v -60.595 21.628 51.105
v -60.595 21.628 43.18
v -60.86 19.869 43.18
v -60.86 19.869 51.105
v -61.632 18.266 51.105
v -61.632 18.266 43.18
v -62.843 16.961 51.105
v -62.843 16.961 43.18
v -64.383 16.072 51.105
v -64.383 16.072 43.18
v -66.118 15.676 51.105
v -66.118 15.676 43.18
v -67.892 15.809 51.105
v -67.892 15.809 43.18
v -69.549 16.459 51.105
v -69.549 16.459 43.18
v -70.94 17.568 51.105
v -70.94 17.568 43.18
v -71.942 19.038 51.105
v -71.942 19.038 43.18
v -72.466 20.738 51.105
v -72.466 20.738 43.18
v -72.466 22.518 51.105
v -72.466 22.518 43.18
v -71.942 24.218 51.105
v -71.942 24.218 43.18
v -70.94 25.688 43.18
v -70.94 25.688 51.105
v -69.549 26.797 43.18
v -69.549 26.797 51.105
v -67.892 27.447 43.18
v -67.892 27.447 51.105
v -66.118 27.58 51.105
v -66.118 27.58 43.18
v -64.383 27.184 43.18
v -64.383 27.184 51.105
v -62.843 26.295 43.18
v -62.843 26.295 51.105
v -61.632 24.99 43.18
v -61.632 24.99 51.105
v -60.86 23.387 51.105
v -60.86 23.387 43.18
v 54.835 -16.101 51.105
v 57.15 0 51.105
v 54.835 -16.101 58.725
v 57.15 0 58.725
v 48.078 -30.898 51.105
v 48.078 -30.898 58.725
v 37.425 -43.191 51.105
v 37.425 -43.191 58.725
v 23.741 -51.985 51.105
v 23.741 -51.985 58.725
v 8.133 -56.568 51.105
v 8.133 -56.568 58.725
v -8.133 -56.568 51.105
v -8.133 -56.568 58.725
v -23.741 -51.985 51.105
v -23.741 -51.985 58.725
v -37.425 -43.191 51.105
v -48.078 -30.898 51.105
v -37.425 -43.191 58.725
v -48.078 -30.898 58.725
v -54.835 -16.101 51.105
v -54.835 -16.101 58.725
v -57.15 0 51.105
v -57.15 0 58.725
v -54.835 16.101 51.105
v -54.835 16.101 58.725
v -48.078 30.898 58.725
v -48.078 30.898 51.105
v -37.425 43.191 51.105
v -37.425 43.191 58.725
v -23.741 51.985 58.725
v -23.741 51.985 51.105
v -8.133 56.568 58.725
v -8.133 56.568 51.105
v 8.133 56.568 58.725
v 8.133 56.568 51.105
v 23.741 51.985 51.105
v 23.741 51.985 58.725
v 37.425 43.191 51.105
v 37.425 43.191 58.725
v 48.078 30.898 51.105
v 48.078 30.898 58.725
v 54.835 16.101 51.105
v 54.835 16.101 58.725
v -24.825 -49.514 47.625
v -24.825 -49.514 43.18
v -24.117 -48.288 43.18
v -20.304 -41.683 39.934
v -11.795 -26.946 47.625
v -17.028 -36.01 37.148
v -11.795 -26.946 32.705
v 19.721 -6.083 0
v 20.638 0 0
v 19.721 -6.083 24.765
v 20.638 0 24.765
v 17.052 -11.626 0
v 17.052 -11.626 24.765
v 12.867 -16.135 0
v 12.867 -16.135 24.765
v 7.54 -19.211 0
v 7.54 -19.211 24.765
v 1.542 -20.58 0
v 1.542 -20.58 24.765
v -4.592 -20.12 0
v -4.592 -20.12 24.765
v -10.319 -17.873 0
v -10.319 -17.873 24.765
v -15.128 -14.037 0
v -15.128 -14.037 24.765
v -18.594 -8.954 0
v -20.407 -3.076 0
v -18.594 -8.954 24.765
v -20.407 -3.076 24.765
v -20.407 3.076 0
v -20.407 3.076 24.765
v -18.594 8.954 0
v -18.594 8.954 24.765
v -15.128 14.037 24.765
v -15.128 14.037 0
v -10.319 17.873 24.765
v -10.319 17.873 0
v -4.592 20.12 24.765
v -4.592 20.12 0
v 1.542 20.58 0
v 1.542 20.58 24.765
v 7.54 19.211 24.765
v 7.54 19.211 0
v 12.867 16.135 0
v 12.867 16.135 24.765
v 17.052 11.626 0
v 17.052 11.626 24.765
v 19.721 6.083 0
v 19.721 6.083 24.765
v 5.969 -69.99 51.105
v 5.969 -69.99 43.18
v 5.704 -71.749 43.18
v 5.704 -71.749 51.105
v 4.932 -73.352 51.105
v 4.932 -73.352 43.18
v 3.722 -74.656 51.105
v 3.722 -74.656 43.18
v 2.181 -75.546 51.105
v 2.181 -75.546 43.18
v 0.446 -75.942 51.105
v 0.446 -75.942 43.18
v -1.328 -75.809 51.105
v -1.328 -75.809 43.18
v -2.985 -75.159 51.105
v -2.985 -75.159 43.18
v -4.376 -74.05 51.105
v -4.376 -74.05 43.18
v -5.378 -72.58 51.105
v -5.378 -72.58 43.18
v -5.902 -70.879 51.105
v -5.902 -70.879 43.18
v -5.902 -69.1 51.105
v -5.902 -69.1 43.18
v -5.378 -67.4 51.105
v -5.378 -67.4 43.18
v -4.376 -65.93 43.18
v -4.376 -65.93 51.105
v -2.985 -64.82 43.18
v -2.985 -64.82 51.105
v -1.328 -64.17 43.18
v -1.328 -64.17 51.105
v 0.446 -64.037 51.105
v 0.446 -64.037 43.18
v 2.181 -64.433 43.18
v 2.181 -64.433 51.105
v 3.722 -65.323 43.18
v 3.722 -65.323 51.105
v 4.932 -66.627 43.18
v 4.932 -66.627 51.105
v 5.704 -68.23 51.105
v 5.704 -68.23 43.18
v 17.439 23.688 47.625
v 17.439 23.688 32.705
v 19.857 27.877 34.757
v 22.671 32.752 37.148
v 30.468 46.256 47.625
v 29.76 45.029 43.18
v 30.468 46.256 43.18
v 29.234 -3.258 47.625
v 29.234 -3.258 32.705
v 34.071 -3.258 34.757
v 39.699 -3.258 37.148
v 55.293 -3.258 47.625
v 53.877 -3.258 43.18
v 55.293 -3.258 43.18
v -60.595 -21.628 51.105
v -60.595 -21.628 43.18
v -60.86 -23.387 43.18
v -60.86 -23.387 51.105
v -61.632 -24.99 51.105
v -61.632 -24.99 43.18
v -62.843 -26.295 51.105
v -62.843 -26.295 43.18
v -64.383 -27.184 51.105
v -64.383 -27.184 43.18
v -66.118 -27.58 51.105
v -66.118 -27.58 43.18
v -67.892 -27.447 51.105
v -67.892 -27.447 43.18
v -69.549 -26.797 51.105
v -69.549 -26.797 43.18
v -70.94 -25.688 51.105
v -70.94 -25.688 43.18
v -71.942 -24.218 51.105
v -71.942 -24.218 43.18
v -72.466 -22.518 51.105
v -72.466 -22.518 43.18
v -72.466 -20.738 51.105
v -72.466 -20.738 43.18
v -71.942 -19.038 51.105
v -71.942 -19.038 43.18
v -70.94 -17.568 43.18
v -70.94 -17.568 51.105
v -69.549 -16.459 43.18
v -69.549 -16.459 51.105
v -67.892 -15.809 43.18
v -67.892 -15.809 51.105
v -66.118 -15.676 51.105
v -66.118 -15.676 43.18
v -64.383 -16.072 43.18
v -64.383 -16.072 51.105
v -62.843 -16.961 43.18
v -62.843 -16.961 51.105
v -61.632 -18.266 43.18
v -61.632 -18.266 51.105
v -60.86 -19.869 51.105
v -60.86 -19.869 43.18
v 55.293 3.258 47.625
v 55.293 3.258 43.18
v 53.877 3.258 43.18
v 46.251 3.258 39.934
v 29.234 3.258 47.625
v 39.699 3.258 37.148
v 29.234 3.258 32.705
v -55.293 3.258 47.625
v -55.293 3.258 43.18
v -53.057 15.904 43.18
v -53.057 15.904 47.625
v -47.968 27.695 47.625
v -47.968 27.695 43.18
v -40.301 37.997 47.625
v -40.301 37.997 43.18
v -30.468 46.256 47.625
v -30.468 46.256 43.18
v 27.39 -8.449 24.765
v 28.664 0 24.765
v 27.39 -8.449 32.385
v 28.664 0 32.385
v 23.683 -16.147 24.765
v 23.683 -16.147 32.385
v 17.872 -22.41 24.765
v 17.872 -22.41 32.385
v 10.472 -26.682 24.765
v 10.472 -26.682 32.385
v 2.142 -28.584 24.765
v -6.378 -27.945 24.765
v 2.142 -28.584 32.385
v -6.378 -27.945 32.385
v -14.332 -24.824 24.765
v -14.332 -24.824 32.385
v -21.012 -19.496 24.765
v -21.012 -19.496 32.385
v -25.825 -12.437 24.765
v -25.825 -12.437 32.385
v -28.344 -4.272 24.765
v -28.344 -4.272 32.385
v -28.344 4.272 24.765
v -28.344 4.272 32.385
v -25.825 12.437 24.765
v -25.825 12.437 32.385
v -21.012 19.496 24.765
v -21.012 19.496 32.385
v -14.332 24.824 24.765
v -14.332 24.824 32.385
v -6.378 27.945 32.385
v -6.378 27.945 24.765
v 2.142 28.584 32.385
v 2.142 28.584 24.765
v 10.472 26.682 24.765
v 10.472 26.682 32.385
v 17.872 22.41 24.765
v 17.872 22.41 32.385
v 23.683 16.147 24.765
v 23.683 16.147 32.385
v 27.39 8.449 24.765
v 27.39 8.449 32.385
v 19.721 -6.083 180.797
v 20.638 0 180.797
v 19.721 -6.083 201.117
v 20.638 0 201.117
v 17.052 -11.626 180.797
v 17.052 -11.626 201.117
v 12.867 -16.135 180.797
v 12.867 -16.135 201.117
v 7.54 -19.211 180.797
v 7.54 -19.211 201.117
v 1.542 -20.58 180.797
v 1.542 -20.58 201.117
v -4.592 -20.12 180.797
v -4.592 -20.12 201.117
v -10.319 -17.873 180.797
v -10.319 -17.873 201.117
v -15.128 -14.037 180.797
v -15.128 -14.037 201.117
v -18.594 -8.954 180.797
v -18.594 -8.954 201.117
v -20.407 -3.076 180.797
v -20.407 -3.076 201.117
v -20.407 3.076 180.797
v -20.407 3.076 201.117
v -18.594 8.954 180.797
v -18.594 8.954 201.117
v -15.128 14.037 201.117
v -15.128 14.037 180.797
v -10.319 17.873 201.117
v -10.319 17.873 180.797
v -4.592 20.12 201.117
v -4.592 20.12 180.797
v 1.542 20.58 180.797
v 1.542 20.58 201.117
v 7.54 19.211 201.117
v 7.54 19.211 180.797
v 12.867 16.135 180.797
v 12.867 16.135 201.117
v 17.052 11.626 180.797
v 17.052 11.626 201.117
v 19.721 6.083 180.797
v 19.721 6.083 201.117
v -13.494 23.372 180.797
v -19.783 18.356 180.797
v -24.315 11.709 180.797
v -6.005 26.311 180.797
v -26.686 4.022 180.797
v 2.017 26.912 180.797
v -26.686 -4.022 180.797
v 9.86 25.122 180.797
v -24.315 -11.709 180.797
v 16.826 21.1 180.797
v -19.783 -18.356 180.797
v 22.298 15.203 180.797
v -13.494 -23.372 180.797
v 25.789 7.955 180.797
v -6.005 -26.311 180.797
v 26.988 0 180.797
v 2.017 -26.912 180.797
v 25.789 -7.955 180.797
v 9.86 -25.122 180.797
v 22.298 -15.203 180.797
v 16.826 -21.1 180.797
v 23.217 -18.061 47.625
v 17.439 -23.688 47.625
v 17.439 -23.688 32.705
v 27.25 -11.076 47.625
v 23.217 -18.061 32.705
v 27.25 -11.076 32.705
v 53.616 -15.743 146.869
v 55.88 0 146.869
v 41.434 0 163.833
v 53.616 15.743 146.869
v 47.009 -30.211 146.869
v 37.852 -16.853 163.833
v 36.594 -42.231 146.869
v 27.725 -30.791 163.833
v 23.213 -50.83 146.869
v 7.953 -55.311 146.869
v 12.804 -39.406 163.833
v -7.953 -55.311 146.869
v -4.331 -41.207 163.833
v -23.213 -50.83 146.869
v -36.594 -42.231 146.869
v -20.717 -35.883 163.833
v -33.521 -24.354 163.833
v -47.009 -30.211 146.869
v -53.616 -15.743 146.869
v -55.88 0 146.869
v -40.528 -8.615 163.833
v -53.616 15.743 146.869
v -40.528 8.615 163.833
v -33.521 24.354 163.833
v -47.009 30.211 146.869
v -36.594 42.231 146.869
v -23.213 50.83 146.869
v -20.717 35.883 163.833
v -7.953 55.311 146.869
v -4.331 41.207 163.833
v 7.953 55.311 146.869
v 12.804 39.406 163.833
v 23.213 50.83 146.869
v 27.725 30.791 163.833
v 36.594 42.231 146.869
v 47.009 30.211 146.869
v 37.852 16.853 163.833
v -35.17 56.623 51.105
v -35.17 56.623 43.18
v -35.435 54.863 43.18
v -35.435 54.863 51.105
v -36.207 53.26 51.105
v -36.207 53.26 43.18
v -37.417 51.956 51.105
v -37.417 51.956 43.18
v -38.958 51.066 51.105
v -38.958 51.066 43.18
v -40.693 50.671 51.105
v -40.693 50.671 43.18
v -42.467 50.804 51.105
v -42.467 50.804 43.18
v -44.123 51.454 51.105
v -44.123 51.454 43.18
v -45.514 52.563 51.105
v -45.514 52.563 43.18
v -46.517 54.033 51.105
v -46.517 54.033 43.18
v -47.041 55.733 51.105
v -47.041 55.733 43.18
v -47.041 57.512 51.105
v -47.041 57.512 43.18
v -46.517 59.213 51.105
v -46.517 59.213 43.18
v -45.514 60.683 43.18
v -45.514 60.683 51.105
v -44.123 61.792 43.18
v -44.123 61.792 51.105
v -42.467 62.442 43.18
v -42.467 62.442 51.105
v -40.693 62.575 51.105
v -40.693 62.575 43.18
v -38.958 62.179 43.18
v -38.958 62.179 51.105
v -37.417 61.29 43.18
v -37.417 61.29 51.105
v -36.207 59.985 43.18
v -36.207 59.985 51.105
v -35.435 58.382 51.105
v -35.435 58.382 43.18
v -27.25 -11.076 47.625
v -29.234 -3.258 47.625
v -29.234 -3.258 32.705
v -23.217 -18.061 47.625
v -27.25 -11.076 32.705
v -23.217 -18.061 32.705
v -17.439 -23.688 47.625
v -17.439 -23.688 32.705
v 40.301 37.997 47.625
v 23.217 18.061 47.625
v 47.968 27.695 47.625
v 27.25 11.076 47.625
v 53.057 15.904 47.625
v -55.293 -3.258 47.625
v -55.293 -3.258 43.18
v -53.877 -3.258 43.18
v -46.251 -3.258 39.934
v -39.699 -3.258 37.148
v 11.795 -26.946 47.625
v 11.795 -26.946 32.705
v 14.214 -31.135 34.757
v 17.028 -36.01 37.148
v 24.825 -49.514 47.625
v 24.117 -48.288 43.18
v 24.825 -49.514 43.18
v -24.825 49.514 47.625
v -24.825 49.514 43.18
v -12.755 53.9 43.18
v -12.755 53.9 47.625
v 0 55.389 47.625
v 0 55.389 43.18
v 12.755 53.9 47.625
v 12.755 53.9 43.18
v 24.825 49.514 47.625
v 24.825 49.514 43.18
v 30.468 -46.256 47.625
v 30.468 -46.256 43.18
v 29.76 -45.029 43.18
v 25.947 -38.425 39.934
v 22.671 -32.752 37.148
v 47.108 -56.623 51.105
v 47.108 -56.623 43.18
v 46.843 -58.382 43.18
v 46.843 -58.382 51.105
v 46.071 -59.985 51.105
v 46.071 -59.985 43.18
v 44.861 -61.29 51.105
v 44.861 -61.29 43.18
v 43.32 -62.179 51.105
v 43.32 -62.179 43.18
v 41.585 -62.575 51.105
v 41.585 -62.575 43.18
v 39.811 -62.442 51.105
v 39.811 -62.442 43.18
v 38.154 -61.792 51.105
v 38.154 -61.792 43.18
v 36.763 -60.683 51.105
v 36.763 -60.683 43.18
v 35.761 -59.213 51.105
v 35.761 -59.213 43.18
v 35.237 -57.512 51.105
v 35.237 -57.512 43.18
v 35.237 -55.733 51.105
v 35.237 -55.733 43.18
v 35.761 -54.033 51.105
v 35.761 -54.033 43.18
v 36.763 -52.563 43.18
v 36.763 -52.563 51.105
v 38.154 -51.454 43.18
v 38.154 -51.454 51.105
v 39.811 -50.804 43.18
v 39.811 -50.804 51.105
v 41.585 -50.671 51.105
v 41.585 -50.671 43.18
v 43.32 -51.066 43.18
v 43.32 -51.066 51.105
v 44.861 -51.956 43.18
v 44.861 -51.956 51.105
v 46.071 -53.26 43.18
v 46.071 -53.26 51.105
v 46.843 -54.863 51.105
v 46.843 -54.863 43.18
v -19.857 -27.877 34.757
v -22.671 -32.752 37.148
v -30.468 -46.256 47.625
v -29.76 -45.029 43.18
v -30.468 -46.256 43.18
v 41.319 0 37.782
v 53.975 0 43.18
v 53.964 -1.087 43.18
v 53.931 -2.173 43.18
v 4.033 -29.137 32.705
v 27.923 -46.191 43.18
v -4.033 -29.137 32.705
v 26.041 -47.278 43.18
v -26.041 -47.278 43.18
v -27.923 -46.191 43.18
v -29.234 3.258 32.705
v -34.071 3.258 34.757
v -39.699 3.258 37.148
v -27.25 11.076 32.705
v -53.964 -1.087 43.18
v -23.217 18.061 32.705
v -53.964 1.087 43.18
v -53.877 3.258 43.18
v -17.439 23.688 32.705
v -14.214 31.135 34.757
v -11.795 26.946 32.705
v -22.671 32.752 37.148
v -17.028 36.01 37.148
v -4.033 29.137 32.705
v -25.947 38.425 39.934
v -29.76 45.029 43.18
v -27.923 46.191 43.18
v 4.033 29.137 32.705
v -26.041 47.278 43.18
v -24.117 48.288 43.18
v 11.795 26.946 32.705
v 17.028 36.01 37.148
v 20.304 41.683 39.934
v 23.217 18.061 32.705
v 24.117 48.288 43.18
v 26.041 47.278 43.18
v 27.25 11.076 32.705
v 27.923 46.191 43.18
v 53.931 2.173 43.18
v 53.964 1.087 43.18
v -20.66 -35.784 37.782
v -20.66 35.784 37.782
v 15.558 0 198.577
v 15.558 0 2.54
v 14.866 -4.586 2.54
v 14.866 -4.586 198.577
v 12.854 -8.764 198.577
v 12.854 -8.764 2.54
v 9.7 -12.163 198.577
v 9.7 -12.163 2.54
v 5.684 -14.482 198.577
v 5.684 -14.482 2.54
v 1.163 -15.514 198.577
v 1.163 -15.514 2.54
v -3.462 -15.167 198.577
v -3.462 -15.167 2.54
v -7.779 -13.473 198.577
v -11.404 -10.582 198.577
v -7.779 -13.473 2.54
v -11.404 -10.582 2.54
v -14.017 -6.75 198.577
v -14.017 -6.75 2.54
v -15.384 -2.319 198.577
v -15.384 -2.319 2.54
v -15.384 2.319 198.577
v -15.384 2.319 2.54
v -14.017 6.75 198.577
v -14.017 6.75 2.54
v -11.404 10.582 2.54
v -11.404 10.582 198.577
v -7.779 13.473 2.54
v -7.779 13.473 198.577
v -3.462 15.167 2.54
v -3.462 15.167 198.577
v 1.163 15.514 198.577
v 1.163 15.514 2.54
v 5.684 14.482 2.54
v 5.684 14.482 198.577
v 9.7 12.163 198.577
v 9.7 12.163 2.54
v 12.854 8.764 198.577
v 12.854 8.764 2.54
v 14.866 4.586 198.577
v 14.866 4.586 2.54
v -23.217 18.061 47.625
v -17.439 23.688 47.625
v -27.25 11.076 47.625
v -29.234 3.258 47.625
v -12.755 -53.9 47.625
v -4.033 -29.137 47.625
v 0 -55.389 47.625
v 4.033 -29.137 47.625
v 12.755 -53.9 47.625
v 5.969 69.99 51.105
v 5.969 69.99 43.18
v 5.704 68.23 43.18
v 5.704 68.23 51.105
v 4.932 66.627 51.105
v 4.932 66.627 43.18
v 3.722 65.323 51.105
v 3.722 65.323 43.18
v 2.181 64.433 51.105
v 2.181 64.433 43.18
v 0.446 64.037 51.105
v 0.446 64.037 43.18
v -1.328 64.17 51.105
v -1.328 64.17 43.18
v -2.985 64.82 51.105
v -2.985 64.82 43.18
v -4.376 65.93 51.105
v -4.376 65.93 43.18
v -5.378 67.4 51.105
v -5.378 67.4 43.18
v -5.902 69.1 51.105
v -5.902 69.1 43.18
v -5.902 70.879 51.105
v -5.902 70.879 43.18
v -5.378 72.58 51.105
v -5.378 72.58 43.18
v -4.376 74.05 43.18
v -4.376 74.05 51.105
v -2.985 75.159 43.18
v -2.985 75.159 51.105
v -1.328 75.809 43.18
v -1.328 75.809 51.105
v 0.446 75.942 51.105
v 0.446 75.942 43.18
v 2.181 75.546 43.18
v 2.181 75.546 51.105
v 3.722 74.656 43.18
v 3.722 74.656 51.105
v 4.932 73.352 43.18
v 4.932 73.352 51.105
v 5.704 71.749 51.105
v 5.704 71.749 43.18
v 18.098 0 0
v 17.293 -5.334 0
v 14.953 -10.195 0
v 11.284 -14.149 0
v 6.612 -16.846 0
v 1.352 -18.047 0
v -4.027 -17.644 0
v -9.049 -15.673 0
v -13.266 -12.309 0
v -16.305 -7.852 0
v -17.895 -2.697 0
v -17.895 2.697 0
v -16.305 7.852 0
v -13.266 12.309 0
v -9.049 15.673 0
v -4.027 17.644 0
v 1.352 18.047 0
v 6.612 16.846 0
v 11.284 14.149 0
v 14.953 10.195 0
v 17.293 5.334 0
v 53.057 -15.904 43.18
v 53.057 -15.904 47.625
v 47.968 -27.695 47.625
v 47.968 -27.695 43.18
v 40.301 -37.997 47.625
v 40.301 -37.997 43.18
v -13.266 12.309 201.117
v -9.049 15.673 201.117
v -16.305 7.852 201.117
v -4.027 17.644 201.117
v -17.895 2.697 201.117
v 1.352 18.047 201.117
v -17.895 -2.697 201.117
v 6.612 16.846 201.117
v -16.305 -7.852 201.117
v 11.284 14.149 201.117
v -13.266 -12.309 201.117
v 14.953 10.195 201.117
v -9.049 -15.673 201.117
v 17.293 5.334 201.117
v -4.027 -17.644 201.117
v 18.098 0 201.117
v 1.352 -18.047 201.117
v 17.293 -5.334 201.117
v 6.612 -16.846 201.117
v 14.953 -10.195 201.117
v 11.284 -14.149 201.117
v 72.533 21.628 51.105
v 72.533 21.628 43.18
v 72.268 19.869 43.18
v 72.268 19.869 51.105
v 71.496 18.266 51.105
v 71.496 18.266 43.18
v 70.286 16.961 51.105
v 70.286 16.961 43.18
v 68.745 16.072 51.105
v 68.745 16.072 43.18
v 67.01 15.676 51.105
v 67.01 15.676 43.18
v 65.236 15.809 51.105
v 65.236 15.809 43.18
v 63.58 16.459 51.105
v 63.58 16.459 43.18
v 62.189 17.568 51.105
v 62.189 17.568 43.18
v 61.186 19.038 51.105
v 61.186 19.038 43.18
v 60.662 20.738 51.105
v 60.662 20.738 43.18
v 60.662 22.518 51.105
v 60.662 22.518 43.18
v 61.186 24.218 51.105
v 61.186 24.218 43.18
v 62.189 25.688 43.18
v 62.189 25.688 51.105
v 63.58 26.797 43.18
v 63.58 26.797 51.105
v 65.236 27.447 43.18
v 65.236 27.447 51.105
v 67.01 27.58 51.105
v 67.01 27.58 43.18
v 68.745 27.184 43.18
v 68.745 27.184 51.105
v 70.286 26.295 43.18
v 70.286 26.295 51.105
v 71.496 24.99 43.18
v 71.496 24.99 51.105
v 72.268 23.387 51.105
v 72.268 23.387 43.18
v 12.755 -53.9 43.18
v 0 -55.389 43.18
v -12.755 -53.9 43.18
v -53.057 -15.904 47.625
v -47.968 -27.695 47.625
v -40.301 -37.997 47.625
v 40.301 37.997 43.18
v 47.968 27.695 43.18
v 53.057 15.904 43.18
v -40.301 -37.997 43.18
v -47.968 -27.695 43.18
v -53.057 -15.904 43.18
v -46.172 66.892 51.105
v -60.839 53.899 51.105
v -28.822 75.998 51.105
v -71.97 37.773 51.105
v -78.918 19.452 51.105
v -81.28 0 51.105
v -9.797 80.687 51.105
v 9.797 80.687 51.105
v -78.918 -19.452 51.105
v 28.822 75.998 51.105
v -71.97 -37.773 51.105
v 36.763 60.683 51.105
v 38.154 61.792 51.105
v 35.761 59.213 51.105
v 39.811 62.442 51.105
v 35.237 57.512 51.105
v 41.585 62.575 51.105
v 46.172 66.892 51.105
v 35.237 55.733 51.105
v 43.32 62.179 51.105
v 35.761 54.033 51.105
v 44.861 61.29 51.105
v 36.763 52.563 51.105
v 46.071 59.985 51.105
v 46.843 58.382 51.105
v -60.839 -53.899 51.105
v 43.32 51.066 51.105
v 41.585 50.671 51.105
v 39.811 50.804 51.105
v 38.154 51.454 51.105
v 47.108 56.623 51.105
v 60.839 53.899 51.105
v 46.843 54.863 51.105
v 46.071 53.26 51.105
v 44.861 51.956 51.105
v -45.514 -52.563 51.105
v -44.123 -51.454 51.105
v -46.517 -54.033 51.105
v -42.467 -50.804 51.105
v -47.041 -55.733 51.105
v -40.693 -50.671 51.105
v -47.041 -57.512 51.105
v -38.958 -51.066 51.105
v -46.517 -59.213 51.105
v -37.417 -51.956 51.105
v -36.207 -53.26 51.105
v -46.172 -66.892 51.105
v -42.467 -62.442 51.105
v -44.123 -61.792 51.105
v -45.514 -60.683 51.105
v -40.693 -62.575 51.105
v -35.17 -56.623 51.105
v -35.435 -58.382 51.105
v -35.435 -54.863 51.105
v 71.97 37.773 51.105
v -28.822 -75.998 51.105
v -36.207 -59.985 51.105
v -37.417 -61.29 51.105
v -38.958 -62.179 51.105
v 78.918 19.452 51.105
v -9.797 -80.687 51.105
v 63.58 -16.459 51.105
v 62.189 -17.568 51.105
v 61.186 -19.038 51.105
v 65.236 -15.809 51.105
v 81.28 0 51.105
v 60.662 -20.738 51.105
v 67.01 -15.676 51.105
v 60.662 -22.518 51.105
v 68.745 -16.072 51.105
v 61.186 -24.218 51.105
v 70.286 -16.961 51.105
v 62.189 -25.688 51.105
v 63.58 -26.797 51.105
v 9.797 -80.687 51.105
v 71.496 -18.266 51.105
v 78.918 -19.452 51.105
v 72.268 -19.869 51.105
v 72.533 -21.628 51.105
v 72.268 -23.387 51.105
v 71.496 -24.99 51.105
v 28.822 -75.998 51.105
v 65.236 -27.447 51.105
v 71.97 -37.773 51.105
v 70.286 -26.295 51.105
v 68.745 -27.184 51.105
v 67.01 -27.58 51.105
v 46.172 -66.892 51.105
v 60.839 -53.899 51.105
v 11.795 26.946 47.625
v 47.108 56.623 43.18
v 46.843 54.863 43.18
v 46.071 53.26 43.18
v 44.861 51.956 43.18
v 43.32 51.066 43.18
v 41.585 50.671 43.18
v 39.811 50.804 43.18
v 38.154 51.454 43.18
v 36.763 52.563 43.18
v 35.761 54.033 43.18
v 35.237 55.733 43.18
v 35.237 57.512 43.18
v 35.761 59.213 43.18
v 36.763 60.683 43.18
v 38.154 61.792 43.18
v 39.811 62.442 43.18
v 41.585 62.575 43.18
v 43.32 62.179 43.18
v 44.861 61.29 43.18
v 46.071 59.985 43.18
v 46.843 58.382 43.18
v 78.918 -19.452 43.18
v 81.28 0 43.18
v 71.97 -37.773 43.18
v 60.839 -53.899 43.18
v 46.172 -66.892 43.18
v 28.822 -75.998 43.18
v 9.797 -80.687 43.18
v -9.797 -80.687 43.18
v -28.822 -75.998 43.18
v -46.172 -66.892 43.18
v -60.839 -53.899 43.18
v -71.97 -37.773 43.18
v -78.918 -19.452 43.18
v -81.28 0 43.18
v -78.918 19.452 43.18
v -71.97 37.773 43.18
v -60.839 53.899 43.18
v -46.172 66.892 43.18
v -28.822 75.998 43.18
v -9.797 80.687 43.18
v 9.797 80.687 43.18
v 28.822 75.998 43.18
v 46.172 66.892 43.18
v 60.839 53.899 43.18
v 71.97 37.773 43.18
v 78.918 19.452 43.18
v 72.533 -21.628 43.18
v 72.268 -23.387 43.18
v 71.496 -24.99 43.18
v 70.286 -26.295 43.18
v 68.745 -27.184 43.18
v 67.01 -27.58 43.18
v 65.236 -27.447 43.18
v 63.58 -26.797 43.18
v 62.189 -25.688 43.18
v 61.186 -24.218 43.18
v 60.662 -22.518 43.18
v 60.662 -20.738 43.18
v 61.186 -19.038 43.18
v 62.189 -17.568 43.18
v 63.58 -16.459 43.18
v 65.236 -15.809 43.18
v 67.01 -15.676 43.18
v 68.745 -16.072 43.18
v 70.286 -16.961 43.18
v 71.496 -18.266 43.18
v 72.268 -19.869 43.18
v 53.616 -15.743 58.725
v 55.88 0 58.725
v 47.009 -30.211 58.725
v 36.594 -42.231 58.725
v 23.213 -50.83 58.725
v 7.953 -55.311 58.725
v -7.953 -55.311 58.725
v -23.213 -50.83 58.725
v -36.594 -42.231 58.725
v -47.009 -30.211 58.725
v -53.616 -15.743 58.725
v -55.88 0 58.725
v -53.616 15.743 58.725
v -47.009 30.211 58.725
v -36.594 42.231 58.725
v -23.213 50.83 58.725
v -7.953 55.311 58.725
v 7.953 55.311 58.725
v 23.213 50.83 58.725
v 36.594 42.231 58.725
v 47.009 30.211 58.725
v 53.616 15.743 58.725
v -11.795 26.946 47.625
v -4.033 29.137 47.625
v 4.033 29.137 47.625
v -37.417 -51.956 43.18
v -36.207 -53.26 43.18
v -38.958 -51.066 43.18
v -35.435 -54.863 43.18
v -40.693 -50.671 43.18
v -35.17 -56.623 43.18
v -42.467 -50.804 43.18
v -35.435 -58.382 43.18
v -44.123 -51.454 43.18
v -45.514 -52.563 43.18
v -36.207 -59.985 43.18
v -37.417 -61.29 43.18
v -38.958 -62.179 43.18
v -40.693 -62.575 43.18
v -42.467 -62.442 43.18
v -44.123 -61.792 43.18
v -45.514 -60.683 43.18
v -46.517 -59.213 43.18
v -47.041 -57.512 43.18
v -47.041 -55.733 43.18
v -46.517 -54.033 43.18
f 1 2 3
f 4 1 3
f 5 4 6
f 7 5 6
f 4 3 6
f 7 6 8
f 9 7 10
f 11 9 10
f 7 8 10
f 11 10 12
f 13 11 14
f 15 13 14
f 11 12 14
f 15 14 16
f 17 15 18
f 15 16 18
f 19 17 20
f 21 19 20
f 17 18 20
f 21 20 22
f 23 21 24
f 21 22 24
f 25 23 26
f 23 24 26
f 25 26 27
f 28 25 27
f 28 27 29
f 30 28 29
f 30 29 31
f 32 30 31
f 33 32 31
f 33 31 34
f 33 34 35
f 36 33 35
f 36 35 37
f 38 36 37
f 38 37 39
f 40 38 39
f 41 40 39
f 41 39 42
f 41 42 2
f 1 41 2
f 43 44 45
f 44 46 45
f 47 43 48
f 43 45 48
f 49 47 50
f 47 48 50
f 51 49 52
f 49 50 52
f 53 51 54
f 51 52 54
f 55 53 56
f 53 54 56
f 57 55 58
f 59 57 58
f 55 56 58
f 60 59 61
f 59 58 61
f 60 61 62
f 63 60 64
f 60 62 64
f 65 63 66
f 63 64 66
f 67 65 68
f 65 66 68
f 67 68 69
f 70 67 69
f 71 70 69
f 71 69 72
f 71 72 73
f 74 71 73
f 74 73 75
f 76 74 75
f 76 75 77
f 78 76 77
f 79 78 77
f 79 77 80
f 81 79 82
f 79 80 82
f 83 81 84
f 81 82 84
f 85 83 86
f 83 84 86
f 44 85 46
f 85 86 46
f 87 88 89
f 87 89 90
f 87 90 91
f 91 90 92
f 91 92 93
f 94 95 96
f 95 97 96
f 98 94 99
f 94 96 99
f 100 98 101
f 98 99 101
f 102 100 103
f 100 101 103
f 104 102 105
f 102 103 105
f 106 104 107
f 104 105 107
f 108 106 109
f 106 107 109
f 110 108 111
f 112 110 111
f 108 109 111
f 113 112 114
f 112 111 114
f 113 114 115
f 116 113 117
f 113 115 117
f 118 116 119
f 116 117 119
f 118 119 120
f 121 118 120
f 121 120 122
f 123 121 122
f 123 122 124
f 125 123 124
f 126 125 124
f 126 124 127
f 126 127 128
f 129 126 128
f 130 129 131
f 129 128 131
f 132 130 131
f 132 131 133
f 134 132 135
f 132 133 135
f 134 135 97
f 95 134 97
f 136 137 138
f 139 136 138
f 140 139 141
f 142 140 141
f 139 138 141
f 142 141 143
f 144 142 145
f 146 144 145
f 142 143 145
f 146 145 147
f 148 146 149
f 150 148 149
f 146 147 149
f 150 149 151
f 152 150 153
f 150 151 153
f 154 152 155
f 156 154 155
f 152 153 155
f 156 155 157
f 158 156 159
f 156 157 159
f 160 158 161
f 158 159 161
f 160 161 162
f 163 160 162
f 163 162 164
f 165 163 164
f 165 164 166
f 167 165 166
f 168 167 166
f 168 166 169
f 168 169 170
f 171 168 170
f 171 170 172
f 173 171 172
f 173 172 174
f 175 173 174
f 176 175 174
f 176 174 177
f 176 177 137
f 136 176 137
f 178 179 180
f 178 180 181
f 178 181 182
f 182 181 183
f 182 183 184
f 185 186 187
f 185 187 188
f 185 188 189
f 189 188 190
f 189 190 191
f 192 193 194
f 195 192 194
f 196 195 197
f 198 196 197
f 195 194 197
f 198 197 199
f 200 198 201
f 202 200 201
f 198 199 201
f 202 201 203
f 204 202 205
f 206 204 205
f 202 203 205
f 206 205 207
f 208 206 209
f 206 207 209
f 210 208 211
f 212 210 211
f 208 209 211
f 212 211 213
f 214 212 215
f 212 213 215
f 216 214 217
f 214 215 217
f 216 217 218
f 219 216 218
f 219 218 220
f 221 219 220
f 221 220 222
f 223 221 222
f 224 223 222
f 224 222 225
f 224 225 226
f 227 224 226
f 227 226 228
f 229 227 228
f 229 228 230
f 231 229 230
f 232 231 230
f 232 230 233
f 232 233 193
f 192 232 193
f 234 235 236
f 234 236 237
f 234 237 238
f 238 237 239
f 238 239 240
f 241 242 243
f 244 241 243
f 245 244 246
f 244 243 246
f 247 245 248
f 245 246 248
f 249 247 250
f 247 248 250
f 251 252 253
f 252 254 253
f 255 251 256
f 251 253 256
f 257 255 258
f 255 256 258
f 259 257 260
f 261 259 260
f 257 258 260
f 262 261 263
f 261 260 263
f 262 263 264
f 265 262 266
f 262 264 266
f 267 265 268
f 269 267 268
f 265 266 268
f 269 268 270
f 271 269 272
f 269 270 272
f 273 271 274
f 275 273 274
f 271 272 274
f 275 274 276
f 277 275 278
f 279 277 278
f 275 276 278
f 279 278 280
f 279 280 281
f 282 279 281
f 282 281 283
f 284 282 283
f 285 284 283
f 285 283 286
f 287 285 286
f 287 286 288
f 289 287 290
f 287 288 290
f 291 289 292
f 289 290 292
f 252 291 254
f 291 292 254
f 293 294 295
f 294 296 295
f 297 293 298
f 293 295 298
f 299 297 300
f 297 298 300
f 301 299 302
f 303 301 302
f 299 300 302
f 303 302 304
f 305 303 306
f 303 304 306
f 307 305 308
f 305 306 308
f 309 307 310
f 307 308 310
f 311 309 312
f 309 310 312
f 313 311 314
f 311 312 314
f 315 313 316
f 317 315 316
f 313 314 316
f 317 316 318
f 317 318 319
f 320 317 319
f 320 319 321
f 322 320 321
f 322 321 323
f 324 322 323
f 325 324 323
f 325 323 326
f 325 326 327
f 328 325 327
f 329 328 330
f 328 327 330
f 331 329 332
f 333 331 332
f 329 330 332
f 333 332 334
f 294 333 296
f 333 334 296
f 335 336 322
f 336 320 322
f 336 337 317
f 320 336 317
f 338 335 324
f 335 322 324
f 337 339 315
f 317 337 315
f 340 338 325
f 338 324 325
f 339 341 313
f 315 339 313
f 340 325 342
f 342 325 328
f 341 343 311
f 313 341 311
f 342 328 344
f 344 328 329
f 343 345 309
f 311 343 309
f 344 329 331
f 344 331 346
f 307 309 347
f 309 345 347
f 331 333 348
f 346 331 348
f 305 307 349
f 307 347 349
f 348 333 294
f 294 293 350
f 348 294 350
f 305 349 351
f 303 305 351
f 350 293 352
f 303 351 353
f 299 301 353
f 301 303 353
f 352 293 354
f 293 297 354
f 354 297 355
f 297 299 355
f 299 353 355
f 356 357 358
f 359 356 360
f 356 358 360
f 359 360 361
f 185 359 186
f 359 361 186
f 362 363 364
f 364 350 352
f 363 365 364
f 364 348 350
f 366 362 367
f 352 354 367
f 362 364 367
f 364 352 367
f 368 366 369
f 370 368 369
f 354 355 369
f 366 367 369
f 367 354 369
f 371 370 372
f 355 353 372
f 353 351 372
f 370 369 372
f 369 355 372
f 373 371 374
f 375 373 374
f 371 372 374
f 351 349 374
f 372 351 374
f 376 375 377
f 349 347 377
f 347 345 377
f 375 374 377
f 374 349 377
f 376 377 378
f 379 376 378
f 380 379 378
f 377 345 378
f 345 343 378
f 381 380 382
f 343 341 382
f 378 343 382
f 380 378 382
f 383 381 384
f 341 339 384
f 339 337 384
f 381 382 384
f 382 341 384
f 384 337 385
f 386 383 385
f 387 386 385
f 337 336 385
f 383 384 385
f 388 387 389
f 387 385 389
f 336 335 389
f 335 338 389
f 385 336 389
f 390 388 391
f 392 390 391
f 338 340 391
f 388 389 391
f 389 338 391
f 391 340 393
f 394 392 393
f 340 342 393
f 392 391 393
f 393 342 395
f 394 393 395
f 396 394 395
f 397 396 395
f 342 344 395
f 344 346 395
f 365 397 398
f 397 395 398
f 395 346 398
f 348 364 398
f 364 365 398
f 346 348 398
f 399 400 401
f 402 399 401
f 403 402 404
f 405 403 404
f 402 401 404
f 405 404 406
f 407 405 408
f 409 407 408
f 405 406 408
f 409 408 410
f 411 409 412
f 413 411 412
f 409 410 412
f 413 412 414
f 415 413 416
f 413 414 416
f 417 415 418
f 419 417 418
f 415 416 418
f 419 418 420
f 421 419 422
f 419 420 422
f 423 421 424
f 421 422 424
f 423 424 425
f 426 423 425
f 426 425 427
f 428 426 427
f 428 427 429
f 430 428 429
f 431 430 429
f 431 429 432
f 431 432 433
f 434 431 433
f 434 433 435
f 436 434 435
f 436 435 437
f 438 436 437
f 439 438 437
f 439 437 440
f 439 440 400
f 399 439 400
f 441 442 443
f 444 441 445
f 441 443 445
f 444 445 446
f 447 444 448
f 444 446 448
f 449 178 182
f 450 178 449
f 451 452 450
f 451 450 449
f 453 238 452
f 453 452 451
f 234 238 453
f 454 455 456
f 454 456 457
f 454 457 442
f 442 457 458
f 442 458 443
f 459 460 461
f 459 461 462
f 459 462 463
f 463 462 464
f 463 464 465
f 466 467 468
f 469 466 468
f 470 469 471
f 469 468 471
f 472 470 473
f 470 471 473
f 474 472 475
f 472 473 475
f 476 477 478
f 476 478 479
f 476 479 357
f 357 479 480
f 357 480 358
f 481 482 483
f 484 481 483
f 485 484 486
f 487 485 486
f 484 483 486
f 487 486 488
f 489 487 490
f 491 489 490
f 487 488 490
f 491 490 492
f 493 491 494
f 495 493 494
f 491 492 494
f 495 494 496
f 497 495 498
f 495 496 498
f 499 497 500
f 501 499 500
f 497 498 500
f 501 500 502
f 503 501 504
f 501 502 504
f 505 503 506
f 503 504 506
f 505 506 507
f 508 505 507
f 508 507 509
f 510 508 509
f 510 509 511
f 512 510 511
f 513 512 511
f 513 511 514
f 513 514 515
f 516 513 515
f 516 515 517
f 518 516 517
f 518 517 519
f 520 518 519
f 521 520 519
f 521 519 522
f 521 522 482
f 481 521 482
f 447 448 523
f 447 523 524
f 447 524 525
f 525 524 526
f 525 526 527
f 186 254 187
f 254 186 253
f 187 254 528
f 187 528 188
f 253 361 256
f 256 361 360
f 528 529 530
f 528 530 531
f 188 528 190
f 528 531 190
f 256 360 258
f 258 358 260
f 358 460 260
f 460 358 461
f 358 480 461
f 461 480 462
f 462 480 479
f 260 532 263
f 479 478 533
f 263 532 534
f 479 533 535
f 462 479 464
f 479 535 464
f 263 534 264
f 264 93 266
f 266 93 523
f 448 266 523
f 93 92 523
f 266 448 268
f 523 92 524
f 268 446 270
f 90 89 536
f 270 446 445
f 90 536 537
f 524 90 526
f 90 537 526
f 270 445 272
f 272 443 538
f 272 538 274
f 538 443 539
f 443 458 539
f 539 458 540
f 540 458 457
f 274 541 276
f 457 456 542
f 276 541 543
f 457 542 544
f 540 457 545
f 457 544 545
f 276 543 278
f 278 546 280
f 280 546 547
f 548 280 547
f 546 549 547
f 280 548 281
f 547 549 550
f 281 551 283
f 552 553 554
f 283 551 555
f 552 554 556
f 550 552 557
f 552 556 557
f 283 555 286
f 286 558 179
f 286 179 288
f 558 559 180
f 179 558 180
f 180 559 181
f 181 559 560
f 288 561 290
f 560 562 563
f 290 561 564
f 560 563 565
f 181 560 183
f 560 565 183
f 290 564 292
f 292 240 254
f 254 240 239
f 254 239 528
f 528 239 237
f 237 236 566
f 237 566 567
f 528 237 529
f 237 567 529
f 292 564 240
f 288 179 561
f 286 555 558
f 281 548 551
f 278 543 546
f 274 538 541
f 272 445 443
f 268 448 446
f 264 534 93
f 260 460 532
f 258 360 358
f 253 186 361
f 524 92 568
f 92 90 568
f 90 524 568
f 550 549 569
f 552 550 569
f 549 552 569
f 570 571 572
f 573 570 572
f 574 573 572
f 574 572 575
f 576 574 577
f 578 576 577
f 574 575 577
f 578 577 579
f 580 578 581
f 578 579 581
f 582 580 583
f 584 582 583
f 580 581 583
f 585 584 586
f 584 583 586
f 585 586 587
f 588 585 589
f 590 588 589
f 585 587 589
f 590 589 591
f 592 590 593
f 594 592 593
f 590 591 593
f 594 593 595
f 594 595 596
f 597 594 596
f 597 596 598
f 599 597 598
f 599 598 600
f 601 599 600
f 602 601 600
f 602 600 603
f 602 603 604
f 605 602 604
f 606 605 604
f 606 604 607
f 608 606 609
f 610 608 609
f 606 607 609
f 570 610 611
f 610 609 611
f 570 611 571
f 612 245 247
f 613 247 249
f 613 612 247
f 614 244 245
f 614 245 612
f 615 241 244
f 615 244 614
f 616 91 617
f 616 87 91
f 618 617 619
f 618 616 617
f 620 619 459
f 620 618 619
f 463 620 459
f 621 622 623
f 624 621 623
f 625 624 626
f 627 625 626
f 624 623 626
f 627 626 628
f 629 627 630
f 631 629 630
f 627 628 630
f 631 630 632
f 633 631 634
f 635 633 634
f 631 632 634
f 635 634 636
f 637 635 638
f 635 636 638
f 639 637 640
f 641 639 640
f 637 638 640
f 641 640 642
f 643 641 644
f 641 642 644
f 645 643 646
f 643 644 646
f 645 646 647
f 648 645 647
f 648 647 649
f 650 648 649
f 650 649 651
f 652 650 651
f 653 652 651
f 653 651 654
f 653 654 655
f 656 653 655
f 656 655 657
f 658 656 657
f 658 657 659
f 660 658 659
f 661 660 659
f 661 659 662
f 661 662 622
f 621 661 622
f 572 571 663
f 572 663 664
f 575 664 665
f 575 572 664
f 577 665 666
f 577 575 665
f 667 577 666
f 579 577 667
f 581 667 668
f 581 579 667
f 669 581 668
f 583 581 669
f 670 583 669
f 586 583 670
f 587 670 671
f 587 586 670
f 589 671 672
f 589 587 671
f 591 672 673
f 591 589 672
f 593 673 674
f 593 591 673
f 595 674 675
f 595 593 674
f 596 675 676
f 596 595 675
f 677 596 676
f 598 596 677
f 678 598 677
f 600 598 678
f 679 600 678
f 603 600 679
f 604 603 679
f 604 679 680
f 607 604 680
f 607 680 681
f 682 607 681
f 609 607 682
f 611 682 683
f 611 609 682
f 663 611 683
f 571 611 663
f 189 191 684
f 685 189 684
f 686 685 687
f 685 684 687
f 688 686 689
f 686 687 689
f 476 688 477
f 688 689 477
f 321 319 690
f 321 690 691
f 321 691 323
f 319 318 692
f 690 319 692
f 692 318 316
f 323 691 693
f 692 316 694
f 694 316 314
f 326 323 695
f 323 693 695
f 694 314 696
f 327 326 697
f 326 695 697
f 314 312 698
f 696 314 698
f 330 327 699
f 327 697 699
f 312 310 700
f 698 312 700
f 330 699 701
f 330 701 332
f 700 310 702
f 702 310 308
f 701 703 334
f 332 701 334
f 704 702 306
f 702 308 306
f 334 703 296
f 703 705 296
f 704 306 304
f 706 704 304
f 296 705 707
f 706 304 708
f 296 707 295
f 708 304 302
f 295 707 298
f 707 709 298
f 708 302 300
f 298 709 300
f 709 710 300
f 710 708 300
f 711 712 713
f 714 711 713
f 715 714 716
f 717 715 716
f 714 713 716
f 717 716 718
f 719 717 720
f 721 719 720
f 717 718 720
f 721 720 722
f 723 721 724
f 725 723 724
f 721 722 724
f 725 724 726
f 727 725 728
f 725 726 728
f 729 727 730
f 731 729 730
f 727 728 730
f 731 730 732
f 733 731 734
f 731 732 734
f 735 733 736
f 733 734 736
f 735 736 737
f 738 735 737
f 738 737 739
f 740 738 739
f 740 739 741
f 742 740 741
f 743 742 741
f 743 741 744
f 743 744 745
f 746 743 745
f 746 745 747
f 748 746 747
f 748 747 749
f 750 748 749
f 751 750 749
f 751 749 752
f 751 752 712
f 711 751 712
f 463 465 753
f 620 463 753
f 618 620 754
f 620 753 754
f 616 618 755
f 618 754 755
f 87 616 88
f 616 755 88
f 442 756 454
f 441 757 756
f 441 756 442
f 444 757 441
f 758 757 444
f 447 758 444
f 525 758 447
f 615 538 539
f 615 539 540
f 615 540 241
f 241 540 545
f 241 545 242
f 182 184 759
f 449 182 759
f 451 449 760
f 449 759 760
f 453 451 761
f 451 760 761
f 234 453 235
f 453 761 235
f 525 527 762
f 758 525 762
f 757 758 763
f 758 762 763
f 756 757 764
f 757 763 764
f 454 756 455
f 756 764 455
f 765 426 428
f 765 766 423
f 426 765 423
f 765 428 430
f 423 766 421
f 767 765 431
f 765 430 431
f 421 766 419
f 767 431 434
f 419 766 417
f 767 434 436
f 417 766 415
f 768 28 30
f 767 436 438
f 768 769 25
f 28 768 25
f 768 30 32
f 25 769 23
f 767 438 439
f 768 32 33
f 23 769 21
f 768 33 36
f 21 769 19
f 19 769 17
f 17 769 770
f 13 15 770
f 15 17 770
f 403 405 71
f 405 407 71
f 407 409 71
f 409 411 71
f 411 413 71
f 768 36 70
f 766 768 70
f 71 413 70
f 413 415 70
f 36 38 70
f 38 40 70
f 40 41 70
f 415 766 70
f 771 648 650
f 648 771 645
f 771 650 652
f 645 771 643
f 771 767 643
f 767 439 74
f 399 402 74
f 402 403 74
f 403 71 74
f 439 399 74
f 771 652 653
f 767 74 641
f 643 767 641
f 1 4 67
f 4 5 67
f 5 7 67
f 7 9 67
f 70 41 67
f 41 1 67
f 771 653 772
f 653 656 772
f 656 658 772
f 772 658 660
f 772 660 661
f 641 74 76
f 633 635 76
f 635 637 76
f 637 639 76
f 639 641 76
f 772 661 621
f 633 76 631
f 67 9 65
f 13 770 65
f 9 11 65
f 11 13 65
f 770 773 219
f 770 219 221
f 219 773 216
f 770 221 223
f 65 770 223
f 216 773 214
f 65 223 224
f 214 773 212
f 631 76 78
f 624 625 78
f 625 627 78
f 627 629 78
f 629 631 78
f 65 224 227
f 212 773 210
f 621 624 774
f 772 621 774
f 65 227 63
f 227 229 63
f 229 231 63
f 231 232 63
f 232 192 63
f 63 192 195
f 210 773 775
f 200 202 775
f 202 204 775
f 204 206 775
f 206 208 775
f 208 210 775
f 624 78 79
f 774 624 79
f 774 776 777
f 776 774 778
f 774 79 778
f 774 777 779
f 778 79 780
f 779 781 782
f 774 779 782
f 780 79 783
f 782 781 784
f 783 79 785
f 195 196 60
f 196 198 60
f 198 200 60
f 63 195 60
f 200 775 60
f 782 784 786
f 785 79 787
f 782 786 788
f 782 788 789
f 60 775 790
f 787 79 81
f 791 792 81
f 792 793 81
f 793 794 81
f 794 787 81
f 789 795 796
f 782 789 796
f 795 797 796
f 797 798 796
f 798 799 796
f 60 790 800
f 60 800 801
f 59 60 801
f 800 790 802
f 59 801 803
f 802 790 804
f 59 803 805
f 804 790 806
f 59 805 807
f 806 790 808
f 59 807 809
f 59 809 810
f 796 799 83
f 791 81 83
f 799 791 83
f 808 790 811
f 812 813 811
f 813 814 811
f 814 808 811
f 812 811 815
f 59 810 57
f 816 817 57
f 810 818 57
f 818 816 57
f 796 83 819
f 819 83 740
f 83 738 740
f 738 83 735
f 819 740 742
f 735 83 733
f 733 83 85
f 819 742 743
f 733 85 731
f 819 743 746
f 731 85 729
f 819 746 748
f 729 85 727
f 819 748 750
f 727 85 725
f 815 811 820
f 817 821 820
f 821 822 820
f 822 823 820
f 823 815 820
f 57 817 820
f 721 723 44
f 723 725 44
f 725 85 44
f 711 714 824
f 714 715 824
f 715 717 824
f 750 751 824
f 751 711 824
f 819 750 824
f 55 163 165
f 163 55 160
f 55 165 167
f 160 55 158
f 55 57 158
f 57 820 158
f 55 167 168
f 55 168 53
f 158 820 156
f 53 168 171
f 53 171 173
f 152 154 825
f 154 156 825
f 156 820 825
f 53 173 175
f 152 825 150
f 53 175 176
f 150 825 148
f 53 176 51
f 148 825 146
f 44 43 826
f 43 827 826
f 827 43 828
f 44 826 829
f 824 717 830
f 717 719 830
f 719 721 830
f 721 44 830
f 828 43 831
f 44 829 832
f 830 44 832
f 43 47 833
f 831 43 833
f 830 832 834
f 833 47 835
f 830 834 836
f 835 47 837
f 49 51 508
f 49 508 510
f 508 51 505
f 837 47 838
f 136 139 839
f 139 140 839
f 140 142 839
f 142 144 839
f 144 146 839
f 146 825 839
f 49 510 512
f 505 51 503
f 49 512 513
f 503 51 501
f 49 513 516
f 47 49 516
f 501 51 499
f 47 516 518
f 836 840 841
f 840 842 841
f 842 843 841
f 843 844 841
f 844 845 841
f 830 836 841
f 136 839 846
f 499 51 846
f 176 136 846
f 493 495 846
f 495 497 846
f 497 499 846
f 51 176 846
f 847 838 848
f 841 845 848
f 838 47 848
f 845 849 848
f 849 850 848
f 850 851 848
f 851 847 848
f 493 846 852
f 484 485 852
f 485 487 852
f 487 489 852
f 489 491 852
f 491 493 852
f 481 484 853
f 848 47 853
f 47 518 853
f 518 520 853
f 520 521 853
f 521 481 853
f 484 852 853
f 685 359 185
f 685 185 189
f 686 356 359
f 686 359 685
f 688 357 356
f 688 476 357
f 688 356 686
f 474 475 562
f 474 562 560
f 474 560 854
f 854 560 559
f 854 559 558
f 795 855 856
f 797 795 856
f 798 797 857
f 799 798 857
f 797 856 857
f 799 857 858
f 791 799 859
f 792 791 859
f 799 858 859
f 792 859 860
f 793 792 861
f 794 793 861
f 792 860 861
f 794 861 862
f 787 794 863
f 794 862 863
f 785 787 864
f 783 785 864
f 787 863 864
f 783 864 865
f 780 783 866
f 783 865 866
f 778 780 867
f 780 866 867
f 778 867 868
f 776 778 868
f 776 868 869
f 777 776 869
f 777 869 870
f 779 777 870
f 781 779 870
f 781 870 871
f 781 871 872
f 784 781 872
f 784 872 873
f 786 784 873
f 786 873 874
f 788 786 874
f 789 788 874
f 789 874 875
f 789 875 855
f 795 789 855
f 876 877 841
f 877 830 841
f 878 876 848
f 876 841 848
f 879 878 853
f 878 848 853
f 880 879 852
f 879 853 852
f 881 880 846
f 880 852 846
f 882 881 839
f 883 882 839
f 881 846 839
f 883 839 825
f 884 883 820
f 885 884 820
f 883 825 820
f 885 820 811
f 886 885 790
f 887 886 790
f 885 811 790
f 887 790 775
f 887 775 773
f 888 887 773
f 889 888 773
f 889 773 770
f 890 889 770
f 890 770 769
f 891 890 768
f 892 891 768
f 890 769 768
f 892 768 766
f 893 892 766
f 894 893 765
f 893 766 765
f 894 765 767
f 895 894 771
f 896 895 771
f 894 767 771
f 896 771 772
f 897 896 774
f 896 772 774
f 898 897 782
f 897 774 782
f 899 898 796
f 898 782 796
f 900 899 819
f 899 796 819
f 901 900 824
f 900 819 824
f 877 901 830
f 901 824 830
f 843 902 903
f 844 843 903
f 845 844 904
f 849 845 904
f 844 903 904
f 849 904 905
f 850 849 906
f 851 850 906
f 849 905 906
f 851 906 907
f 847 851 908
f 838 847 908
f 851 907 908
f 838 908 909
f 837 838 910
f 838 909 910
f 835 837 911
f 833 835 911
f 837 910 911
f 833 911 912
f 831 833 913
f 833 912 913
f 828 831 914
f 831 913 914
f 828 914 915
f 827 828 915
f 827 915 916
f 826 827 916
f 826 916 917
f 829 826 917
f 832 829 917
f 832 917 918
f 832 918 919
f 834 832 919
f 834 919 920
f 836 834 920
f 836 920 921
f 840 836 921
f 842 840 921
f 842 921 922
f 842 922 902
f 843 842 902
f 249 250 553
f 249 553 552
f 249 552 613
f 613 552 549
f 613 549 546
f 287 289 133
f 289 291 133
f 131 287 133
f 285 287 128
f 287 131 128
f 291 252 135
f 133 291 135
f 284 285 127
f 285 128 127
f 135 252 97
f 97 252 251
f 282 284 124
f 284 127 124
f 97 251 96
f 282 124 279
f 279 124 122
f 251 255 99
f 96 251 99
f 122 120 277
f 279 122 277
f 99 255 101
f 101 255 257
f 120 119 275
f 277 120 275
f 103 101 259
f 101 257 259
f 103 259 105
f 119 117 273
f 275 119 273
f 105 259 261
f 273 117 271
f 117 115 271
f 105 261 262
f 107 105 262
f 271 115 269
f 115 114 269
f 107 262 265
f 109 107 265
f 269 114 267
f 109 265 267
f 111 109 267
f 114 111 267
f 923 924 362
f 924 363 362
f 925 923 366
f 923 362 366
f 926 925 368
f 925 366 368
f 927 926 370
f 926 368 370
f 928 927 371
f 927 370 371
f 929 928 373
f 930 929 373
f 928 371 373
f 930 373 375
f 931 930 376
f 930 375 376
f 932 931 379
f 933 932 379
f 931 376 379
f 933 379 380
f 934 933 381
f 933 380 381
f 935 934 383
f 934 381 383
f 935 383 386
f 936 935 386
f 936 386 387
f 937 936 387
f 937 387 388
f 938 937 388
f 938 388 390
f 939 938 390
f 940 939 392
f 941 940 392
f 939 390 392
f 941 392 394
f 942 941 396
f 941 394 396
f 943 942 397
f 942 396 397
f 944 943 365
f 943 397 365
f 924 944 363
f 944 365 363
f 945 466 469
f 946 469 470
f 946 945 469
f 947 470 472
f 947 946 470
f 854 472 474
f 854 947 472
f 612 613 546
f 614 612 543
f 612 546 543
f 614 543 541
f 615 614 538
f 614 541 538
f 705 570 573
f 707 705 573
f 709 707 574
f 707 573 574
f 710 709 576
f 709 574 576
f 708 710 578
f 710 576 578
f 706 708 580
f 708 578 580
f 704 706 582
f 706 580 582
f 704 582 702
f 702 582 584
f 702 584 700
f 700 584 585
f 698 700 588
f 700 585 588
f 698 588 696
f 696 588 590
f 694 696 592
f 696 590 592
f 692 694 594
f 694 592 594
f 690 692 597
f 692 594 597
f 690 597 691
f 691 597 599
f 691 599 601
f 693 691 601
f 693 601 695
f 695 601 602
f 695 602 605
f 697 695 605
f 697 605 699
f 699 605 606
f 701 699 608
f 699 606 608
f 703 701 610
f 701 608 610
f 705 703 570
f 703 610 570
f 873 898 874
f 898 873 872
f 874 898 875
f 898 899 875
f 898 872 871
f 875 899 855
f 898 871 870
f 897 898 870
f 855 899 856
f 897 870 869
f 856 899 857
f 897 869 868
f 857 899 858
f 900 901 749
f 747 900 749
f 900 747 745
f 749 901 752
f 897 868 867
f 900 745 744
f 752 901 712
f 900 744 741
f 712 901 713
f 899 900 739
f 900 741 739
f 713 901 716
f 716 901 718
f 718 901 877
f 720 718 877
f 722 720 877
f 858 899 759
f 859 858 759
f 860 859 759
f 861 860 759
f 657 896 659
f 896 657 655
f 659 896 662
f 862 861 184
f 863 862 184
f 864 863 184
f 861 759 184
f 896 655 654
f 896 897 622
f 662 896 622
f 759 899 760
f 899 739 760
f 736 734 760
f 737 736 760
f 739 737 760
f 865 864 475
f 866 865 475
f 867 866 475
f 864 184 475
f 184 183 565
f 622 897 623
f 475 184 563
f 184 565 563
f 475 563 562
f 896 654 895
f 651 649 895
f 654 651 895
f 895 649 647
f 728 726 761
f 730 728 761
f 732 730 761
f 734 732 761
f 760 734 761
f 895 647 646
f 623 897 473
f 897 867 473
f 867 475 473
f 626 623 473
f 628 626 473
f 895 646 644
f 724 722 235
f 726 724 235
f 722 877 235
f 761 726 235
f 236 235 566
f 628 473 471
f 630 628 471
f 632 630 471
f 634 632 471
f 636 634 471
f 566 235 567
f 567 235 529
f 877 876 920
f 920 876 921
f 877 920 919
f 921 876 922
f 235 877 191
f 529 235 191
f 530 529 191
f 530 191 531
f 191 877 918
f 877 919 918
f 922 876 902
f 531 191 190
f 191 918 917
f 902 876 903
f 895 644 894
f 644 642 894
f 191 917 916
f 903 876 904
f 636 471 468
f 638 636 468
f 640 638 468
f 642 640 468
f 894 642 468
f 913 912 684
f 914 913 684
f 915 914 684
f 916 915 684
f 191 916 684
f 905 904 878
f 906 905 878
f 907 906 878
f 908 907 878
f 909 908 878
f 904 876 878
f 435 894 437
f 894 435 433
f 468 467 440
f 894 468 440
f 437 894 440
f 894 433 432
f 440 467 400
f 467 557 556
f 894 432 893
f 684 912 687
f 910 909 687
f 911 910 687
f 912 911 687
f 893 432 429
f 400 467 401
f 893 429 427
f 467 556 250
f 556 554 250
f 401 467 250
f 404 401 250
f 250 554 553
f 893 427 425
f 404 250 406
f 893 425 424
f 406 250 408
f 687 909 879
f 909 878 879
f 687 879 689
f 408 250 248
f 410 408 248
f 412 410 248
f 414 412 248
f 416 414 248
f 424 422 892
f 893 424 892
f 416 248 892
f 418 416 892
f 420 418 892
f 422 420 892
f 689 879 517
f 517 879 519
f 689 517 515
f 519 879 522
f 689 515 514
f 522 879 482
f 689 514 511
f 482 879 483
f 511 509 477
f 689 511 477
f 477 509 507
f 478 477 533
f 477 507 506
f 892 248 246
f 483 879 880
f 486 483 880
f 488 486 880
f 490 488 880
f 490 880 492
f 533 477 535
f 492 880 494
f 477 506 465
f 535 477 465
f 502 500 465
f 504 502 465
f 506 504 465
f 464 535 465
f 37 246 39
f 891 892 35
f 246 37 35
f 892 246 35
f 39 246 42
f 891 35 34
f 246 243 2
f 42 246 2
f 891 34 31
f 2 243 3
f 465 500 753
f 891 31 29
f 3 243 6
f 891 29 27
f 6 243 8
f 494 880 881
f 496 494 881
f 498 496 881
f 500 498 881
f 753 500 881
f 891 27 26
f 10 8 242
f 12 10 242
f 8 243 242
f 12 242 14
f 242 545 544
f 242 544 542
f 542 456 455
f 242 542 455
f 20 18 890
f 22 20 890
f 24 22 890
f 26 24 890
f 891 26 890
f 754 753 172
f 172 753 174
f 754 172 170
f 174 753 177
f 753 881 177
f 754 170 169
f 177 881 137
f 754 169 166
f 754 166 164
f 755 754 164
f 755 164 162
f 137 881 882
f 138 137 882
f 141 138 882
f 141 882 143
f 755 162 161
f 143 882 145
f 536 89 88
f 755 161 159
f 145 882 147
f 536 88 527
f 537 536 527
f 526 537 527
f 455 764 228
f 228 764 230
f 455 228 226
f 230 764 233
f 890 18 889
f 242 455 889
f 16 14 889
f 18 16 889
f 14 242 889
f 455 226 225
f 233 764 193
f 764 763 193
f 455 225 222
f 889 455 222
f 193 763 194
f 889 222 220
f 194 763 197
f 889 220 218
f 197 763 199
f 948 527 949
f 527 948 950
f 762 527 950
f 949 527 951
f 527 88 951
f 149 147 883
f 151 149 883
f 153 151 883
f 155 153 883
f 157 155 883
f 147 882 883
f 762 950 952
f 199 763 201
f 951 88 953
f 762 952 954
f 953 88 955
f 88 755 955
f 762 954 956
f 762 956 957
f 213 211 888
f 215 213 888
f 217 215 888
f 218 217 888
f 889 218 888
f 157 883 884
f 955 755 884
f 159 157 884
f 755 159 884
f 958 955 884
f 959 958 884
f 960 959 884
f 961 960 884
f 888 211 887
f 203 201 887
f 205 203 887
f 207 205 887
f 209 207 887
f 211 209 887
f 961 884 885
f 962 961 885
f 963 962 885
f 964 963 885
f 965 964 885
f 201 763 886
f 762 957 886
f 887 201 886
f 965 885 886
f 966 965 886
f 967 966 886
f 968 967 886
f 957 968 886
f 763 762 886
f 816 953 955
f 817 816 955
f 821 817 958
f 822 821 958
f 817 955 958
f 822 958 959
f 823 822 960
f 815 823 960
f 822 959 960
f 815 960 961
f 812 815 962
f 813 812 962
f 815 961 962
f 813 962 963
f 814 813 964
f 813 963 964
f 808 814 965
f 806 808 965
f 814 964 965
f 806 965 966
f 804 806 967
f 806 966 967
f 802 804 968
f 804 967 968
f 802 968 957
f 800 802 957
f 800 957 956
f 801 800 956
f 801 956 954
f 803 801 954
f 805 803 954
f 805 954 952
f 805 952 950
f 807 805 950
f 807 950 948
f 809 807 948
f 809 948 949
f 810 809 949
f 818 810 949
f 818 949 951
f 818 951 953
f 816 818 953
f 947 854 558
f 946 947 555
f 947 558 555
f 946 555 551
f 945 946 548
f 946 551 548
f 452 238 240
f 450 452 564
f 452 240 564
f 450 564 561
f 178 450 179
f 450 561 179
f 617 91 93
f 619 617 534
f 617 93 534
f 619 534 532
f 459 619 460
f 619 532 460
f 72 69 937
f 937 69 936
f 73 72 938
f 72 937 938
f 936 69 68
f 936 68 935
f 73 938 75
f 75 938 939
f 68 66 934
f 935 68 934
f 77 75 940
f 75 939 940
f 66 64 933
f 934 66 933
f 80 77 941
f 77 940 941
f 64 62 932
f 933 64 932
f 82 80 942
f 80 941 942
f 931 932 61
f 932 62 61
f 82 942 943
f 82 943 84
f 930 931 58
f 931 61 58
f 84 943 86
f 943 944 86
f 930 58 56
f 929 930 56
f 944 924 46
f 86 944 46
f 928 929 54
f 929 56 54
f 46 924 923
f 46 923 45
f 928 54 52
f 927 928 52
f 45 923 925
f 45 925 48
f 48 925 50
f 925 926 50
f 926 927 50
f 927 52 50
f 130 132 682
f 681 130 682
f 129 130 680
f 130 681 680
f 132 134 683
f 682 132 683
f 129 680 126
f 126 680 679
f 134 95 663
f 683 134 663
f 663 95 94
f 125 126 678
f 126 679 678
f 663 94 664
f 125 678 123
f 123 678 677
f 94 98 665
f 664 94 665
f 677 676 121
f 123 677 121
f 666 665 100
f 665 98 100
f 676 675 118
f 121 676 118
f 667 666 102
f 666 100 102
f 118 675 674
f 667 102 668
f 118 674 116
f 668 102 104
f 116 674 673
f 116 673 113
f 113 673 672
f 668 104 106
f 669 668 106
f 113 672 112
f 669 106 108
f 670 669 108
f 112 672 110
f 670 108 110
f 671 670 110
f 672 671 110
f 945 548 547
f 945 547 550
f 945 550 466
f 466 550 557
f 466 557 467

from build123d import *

# Parameters (mm, degrees)
F2_SIZE  = 2.54
F5_DEPTH = 22.86
F4_R     = 5.969
F6_DEPTH = 176.3532


with BuildPart() as f1:
    # F0 (on Front) → F1 (revolve)
    with BuildSketch(Plane.XZ):
        Polygon((15.5575, 0), (20.6375, 0), (20.6375, 24.765), (28.6639, 24.765), (28.6639, 32.385), (53.975, 43.18), (81.28, 43.18), (81.28, 51.1048), (57.15, 51.1048), (57.15, 58.7248), (55.88, 58.7248), (55.88, 146.869346), (26.9875, 180.7972), (20.6375, 180.7972), (20.6375, 201.1172), (15.5575, 201.1172), align=None)
    revolve(axis=Axis((0, 0, 0.880979), (0, 0, -1)))

    # F2
    f2_edges = [f1.edges().sort_by_distance(p)[0] for p in [
        (-15.5575, 0, 201.1172),
        (-15.5575, 0, 0),
        (15.5575, 0, 100.5586),
    ]]
    chamfer(f2_edges, length=F2_SIZE)

    # F4 (on offset) → F5 (cut)
    with BuildSketch(Plane(origin=(0, 0, 24.765), x_dir=(1, 0, 0), z_dir=(0, 0, -1))):
        with BuildLine():
            ThreePointArc((17.438577, 23.688146), (25.47399, 14.707415), (29.233824, 3.258178))
            Line((29.233824, 3.258178), (55.293112, 3.258178))
            ThreePointArc((55.293112, 3.258178), (47.968302, 27.694512), (30.468221, 46.256151))
            Line((30.468221, 46.256151), (17.438577, 23.688146))
        make_face()
        with BuildLine():
            ThreePointArc((-11.795247, 26.946324), (0, 29.41483), (11.795247, 26.946324))
            Line((11.795247, 26.946324), (24.824891, 49.514329))
            ThreePointArc((24.824891, 49.514329), (0, 55.389024), (-24.824891, 49.514329))
            Line((-24.824891, 49.514329), (-11.795247, 26.946324))
        make_face()
        with BuildLine():
            ThreePointArc((-29.233824, 3.258178), (-25.47399, 14.707415), (-17.438577, 23.688146))
            Line((-17.438577, 23.688146), (-30.468221, 46.256151))
            ThreePointArc((-30.468221, 46.256151), (-47.968302, 27.694512), (-55.293112, 3.258178))
            Line((-55.293112, 3.258178), (-29.233824, 3.258178))
        make_face()
        with BuildLine():
            Line((-30.468221, -46.256151), (-17.438577, -23.688146))
            ThreePointArc((-17.438577, -23.688146), (-25.47399, -14.707415), (-29.233824, -3.258178))
            Line((-29.233824, -3.258178), (-55.293112, -3.258178))
            ThreePointArc((-55.293112, -3.258178), (-47.968302, -27.694512), (-30.468221, -46.256151))
        make_face()
        with BuildLine():
            Line((24.824891, -49.514329), (11.795247, -26.946324))
            ThreePointArc((11.795247, -26.946324), (0, -29.41483), (-11.795247, -26.946324))
            Line((-11.795247, -26.946324), (-24.824891, -49.514329))
            ThreePointArc((-24.824891, -49.514329), (0, -55.389024), (24.824891, -49.514329))
        make_face()
        with BuildLine():
            Line((55.293112, -3.258178), (29.233824, -3.258178))
            ThreePointArc((29.233824, -3.258178), (25.47399, -14.707415), (17.438577, -23.688146))
            Line((17.438577, -23.688146), (30.468221, -46.256151))
            ThreePointArc((30.468221, -46.256151), (47.968302, -27.694512), (55.293112, -3.258178))
        make_face()
    extrude(amount=-F5_DEPTH, mode=Mode.SUBTRACT)

    # F4 (on offset) → F6 (cut, through all)
    with BuildSketch(Plane(origin=(0, 0, 24.765), x_dir=(1, 0, 0), z_dir=(0, 0, -1))):
        with Locations((0, 69.9897)):
            Circle(F4_R)
        with Locations((41.138913, 56.622857)):
            Circle(F4_R)
        with Locations((66.56416, 21.628007)):
            Circle(F4_R)
        with Locations((66.56416, -21.628007)):
            Circle(F4_R)
        with Locations((-41.138913, 56.622857)):
            Circle(F4_R)
        with Locations((-66.56416, 21.628007)):
            Circle(F4_R)
        with Locations((-66.56416, -21.628007)):
            Circle(F4_R)
        with Locations((-41.138913, -56.622857)):
            Circle(F4_R)
        with Locations((0, -69.9897)):
            Circle(F4_R)
        with Locations((41.138913, -56.622857)):
            Circle(F4_R)
    extrude(amount=-F6_DEPTH, mode=Mode.SUBTRACT)


solid = f1.part
